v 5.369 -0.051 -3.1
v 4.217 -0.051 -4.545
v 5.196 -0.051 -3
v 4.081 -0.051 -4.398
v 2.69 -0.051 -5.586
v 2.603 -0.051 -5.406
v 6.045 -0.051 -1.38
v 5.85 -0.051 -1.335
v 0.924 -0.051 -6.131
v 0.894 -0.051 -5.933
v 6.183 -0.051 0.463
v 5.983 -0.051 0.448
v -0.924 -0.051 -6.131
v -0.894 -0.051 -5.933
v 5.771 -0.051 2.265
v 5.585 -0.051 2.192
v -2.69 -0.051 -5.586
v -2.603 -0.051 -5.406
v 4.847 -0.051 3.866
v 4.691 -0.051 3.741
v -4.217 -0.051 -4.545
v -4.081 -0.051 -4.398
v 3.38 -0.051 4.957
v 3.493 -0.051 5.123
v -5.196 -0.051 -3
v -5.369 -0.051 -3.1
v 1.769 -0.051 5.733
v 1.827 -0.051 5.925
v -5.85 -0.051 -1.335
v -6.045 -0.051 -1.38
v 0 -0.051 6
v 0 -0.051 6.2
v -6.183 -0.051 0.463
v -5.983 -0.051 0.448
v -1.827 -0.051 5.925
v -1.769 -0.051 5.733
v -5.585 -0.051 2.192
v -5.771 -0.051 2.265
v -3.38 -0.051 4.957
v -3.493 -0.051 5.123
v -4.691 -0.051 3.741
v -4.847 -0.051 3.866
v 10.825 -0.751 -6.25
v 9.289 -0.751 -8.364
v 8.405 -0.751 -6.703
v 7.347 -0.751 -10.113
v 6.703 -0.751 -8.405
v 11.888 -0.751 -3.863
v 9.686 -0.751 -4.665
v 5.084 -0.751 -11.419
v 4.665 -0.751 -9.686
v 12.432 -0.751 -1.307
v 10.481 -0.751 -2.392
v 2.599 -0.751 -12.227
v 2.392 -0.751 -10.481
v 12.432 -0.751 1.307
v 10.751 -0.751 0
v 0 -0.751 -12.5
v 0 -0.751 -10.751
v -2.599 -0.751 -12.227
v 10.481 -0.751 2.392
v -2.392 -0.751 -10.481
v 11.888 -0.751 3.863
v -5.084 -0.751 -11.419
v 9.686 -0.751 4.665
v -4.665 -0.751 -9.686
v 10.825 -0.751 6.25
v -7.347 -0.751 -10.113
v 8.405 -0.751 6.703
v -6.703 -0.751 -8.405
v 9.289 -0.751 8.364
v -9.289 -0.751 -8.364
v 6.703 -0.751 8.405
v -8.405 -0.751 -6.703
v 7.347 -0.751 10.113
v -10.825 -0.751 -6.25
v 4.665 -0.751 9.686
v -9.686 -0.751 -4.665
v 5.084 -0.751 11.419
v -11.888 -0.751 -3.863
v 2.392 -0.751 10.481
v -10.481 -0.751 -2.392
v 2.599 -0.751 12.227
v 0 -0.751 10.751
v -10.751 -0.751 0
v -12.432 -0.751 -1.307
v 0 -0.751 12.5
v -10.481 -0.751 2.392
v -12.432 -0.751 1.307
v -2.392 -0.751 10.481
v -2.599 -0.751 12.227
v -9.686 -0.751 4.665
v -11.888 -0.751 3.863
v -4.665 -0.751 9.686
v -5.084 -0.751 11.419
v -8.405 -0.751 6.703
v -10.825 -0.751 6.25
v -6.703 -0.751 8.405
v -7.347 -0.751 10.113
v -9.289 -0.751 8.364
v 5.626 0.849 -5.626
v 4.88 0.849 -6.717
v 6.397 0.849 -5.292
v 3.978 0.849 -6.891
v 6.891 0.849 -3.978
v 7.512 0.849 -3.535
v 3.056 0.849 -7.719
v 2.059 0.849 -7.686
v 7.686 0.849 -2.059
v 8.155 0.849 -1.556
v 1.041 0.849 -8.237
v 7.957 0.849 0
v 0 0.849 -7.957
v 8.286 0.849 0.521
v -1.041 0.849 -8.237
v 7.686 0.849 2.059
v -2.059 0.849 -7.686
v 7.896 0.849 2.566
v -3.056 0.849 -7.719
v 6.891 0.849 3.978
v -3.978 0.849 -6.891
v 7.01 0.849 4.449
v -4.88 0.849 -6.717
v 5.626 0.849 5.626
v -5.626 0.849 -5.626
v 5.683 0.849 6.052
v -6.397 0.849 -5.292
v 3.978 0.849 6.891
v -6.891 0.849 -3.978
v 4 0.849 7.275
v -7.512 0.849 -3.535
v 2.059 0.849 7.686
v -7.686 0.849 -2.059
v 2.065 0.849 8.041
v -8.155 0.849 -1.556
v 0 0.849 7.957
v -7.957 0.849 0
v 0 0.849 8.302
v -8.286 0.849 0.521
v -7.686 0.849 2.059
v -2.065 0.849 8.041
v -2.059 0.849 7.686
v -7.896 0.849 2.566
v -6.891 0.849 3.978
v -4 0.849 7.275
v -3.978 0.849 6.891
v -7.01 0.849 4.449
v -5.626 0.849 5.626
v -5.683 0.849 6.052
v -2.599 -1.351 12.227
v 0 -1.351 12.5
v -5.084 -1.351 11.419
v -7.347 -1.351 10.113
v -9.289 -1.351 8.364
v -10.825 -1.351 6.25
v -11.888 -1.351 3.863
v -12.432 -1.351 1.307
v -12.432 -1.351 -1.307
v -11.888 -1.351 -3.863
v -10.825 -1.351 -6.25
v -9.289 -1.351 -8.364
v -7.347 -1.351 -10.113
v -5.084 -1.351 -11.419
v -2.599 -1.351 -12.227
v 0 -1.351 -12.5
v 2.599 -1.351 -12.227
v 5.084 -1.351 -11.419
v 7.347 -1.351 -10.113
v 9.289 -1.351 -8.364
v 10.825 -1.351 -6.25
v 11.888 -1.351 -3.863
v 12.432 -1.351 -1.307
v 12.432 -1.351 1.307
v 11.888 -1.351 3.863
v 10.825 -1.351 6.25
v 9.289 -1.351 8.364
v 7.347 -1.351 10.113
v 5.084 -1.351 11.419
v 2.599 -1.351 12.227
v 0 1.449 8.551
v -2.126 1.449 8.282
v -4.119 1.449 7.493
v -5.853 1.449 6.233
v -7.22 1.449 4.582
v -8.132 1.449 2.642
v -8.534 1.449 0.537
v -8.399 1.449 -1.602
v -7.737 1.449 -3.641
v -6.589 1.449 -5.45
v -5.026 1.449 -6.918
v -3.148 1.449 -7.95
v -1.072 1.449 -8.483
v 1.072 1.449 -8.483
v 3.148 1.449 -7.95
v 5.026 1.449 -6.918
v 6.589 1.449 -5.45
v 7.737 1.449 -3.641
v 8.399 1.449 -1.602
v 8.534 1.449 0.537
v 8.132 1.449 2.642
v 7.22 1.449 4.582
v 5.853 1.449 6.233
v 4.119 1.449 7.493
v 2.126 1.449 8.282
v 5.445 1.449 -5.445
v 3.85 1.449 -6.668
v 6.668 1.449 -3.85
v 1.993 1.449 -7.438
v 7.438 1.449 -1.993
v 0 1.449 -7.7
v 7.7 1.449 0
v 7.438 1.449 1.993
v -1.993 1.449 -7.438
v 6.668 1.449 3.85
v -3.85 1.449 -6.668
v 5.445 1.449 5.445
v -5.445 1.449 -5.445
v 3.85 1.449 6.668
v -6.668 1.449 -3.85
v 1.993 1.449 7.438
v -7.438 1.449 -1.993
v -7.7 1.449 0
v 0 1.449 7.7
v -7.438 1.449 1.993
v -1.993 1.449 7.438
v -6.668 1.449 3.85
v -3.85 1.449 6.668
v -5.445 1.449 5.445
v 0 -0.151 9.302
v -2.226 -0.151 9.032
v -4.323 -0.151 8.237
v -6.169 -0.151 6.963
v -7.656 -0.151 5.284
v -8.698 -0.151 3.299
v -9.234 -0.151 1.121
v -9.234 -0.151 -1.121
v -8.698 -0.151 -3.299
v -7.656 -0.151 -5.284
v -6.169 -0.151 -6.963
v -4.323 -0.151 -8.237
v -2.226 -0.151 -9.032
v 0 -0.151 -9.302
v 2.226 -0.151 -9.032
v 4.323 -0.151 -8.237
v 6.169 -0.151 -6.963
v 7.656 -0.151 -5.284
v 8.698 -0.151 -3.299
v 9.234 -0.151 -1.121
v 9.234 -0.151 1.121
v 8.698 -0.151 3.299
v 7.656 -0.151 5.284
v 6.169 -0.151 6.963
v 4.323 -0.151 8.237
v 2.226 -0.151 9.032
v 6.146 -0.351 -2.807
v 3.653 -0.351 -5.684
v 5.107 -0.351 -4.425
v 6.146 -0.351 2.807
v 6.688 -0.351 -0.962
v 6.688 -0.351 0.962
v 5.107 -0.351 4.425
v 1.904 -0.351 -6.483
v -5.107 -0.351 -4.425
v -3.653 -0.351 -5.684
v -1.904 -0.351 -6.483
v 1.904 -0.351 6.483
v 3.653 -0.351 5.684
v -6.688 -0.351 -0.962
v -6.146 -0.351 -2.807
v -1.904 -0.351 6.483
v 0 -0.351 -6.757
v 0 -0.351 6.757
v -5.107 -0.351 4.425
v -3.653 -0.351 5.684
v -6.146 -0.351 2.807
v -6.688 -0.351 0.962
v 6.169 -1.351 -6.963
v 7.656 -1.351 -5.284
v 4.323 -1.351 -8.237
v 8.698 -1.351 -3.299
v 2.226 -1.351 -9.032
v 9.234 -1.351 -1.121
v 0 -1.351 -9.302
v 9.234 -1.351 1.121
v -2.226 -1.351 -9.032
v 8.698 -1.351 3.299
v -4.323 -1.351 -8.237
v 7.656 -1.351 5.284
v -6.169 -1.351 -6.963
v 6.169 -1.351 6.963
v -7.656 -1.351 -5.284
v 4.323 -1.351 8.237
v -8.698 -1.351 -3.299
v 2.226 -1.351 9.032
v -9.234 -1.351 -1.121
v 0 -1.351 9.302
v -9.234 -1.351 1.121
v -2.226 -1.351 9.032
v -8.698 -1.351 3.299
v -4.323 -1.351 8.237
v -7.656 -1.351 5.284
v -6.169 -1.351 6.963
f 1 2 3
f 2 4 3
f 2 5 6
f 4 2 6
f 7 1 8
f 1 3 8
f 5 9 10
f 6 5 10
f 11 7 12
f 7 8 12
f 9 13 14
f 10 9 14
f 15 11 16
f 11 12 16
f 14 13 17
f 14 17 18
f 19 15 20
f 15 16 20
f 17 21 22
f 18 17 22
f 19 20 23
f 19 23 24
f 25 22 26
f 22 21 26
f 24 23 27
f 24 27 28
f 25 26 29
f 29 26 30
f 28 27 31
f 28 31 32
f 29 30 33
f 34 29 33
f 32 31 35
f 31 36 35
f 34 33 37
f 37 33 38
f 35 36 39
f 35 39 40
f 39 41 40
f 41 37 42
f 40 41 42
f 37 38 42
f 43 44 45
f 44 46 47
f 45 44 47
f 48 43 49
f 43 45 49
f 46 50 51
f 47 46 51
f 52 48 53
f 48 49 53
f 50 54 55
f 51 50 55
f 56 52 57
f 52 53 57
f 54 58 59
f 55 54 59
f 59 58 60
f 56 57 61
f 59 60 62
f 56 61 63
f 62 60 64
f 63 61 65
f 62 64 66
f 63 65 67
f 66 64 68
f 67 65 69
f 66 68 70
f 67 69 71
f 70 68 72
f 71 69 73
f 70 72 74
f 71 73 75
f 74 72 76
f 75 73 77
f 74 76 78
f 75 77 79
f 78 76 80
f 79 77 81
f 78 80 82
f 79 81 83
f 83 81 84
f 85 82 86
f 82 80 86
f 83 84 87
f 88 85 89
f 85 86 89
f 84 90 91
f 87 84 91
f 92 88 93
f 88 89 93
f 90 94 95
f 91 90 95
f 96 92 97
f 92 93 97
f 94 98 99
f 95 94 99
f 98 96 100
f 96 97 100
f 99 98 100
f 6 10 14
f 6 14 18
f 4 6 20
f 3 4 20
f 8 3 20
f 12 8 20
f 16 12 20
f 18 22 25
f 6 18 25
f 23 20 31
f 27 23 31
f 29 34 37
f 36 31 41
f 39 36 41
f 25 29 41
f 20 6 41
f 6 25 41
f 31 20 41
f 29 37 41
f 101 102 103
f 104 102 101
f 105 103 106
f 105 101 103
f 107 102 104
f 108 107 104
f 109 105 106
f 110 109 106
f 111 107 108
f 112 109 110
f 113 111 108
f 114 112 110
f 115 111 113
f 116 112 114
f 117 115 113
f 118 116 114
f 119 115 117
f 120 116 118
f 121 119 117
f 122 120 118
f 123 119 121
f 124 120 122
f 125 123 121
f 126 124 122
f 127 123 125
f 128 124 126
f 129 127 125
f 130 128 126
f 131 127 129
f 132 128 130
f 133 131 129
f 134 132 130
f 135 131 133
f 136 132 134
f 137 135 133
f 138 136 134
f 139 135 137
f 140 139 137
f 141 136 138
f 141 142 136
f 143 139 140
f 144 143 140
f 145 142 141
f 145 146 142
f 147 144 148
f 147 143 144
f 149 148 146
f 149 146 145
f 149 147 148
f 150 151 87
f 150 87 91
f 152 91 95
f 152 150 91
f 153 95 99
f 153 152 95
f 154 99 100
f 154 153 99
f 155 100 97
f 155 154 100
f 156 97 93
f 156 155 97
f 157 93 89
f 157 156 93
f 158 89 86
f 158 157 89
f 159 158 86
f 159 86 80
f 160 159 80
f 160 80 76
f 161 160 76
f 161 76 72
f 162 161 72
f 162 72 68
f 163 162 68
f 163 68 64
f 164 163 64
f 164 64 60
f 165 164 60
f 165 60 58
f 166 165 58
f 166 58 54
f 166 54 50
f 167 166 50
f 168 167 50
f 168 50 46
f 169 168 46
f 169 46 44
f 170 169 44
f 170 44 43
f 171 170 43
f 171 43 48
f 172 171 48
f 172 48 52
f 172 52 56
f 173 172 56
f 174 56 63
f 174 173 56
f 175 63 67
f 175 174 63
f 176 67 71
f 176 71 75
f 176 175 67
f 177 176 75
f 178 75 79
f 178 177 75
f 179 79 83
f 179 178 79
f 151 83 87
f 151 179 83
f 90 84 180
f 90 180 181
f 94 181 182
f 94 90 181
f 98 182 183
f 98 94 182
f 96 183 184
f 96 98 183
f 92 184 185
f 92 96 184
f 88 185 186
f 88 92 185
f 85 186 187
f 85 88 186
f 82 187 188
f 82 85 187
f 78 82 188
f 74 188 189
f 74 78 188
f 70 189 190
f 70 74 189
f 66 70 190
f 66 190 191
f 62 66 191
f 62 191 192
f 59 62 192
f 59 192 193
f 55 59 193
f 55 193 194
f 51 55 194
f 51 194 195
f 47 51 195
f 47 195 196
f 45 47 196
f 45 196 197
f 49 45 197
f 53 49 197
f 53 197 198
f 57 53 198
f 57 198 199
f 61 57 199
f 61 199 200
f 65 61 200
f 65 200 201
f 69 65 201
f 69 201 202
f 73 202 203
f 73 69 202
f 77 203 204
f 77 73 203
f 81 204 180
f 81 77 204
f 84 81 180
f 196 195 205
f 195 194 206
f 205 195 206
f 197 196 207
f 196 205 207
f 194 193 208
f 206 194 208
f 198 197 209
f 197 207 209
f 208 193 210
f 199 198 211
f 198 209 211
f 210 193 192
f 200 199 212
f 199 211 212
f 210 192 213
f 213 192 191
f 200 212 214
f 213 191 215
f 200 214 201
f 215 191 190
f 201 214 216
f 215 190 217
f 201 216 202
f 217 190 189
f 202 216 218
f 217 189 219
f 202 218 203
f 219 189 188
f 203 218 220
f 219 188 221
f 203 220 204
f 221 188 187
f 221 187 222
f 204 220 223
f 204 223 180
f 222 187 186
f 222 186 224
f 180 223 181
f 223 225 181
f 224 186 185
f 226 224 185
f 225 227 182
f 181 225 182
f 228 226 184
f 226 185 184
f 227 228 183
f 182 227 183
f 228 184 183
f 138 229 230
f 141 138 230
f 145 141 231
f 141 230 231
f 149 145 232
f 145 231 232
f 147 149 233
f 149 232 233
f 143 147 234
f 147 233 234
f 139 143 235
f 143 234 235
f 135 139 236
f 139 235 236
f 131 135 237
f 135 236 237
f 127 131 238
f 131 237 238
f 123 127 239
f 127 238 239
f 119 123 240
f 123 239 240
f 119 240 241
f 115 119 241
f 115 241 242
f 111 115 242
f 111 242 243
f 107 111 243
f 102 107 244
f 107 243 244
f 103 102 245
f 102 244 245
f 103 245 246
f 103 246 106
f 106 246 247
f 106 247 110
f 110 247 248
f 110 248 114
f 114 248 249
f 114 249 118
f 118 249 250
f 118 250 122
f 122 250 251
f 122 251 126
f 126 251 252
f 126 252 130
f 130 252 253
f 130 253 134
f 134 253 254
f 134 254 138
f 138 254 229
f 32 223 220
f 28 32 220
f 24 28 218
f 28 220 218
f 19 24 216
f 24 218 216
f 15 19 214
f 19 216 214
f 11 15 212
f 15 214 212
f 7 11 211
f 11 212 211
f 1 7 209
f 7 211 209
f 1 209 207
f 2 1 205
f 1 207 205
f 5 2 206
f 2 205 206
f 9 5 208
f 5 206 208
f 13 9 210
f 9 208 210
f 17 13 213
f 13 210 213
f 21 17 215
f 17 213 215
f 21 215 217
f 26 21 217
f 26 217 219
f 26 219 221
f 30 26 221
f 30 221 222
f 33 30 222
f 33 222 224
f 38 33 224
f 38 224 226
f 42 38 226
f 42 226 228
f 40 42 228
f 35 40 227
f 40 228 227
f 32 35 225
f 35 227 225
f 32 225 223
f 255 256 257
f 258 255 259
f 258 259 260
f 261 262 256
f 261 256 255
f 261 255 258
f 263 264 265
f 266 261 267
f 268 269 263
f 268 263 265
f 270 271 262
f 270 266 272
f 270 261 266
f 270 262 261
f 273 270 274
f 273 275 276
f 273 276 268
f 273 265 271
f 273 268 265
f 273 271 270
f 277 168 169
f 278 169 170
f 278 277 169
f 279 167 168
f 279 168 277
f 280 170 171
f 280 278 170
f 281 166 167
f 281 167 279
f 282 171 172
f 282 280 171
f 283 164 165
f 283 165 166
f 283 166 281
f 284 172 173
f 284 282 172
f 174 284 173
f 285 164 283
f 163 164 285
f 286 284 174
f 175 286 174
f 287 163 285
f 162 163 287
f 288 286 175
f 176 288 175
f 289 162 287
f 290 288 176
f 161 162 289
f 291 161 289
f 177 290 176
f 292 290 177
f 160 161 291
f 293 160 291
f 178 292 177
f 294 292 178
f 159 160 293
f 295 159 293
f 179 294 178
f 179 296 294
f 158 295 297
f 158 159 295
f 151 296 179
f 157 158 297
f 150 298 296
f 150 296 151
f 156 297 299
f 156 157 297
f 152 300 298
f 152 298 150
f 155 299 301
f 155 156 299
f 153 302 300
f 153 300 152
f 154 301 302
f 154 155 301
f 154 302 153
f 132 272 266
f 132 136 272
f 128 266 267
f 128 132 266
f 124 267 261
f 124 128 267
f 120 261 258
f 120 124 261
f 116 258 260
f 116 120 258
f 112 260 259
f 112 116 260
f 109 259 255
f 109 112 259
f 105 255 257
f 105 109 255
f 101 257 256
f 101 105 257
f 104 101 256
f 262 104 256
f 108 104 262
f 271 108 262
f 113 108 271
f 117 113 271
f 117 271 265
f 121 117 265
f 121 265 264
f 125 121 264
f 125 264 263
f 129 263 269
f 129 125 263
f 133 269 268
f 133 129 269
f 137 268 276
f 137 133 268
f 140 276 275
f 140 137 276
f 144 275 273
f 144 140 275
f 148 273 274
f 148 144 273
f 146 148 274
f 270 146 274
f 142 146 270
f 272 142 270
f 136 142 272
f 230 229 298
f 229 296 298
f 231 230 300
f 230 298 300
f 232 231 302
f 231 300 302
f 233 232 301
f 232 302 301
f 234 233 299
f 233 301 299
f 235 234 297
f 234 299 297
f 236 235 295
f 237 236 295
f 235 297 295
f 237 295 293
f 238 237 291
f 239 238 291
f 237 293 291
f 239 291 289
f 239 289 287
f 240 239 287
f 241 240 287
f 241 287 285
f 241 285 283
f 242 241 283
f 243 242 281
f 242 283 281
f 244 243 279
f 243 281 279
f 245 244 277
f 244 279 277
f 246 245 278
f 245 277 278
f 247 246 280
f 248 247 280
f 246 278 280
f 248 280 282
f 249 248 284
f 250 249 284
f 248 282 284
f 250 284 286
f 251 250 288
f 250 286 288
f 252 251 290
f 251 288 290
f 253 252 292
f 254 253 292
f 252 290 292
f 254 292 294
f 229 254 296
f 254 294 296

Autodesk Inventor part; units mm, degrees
ref_plane "YZ Plane" through (0, 0, 0) normal (1, 0, 0) x (0, 1, 0)
ref_plane "XZ Plane" through (0, 0, 0) normal (0, 1, 0) x (-1, 0, 0)
ref_plane "XY Plane" through (0, 0, 0) normal (0, 0, 1) x (1, 0, 0)
sketch "Skizze1" plane through (0, 0, 0) normal (1, 0, 0) x (0, 1, 0)
  line L0 (3, 8.0893) -> (5.1212, 8.0893) construction
  line L1 (-0.0509, -6) -> (0.0741, -6) construction
  line L2 (0.0741, -6) -> (0.0741, 6) construction
  line L3 (0.0741, 6) -> (-0.0509, 6) construction
  line L4 (-0.0509, 6) -> (-0.0509, -6) construction
  line L5 (-0.0509, -6) -> (0.0741, 6) construction
  line L6 (0.0741, -6) -> (-0.0509, 6) construction
  line L7 (-0.0509, 6) -> (-0.0509, 0)
  line L8 (-0.0509, 0) -> (-0.3509, 0)
  line L9 (-0.3509, 0) -> (-0.3509, 6.7569)
  line L10 (-0.3509, 6.7569) -> (0.8491, 7.9569)
  line L11 (0.8491, 7.9569) -> (0.8491, 8.3023)
  line L12 (-0.0509, 6) -> (-0.0509, 6.2)
  line L13 (-0.0509, 6.2) -> (1.4491, 7.7)
  line L14 (1.4491, 7.7) -> (1.4491, 8.5508)
  line L15 (1.4491, 8.5508) -> (-0.7509, 10.7508)
  line L16 (-1.3509, 12.5) -> (-1.3509, 9.3023)
  line L17 (0.8491, 8.3023) -> (-0.1509, 9.3023)
  line L18 (-0.1509, 9.3023) -> (-1.3509, 9.3023)
  line L19 (-0.7509, 10.7508) -> (-0.7509, 12.5)
  line L20 (-0.7509, 12.5) -> (-1.3509, 12.5)
  point P0 (0.0116, 0)
  point P1 (0.0116, 0)
  dimension "d14" = 0.125
  dimension "d15" = 12
  dimension "d16" = 0.3
  dimension "d18" = 135
  dimension "d20" = 0.2
  dimension "d27" = 135
  dimension "d28" = 1
  dimension "d29" = 1.2
  dimension "d30" = 0.6
  dimension "d31" = 0.6
  dimension "d34" = 1
  dimension "d36" = 0.6
  dimension "d37" = 12.5
revolve "Umdrehung1" add sketch "Skizze1" angle 360 about axis through (0, -0.0509, 0) along (0, -1, 0)
properties part number "50_ETL_Membrane_v0"
